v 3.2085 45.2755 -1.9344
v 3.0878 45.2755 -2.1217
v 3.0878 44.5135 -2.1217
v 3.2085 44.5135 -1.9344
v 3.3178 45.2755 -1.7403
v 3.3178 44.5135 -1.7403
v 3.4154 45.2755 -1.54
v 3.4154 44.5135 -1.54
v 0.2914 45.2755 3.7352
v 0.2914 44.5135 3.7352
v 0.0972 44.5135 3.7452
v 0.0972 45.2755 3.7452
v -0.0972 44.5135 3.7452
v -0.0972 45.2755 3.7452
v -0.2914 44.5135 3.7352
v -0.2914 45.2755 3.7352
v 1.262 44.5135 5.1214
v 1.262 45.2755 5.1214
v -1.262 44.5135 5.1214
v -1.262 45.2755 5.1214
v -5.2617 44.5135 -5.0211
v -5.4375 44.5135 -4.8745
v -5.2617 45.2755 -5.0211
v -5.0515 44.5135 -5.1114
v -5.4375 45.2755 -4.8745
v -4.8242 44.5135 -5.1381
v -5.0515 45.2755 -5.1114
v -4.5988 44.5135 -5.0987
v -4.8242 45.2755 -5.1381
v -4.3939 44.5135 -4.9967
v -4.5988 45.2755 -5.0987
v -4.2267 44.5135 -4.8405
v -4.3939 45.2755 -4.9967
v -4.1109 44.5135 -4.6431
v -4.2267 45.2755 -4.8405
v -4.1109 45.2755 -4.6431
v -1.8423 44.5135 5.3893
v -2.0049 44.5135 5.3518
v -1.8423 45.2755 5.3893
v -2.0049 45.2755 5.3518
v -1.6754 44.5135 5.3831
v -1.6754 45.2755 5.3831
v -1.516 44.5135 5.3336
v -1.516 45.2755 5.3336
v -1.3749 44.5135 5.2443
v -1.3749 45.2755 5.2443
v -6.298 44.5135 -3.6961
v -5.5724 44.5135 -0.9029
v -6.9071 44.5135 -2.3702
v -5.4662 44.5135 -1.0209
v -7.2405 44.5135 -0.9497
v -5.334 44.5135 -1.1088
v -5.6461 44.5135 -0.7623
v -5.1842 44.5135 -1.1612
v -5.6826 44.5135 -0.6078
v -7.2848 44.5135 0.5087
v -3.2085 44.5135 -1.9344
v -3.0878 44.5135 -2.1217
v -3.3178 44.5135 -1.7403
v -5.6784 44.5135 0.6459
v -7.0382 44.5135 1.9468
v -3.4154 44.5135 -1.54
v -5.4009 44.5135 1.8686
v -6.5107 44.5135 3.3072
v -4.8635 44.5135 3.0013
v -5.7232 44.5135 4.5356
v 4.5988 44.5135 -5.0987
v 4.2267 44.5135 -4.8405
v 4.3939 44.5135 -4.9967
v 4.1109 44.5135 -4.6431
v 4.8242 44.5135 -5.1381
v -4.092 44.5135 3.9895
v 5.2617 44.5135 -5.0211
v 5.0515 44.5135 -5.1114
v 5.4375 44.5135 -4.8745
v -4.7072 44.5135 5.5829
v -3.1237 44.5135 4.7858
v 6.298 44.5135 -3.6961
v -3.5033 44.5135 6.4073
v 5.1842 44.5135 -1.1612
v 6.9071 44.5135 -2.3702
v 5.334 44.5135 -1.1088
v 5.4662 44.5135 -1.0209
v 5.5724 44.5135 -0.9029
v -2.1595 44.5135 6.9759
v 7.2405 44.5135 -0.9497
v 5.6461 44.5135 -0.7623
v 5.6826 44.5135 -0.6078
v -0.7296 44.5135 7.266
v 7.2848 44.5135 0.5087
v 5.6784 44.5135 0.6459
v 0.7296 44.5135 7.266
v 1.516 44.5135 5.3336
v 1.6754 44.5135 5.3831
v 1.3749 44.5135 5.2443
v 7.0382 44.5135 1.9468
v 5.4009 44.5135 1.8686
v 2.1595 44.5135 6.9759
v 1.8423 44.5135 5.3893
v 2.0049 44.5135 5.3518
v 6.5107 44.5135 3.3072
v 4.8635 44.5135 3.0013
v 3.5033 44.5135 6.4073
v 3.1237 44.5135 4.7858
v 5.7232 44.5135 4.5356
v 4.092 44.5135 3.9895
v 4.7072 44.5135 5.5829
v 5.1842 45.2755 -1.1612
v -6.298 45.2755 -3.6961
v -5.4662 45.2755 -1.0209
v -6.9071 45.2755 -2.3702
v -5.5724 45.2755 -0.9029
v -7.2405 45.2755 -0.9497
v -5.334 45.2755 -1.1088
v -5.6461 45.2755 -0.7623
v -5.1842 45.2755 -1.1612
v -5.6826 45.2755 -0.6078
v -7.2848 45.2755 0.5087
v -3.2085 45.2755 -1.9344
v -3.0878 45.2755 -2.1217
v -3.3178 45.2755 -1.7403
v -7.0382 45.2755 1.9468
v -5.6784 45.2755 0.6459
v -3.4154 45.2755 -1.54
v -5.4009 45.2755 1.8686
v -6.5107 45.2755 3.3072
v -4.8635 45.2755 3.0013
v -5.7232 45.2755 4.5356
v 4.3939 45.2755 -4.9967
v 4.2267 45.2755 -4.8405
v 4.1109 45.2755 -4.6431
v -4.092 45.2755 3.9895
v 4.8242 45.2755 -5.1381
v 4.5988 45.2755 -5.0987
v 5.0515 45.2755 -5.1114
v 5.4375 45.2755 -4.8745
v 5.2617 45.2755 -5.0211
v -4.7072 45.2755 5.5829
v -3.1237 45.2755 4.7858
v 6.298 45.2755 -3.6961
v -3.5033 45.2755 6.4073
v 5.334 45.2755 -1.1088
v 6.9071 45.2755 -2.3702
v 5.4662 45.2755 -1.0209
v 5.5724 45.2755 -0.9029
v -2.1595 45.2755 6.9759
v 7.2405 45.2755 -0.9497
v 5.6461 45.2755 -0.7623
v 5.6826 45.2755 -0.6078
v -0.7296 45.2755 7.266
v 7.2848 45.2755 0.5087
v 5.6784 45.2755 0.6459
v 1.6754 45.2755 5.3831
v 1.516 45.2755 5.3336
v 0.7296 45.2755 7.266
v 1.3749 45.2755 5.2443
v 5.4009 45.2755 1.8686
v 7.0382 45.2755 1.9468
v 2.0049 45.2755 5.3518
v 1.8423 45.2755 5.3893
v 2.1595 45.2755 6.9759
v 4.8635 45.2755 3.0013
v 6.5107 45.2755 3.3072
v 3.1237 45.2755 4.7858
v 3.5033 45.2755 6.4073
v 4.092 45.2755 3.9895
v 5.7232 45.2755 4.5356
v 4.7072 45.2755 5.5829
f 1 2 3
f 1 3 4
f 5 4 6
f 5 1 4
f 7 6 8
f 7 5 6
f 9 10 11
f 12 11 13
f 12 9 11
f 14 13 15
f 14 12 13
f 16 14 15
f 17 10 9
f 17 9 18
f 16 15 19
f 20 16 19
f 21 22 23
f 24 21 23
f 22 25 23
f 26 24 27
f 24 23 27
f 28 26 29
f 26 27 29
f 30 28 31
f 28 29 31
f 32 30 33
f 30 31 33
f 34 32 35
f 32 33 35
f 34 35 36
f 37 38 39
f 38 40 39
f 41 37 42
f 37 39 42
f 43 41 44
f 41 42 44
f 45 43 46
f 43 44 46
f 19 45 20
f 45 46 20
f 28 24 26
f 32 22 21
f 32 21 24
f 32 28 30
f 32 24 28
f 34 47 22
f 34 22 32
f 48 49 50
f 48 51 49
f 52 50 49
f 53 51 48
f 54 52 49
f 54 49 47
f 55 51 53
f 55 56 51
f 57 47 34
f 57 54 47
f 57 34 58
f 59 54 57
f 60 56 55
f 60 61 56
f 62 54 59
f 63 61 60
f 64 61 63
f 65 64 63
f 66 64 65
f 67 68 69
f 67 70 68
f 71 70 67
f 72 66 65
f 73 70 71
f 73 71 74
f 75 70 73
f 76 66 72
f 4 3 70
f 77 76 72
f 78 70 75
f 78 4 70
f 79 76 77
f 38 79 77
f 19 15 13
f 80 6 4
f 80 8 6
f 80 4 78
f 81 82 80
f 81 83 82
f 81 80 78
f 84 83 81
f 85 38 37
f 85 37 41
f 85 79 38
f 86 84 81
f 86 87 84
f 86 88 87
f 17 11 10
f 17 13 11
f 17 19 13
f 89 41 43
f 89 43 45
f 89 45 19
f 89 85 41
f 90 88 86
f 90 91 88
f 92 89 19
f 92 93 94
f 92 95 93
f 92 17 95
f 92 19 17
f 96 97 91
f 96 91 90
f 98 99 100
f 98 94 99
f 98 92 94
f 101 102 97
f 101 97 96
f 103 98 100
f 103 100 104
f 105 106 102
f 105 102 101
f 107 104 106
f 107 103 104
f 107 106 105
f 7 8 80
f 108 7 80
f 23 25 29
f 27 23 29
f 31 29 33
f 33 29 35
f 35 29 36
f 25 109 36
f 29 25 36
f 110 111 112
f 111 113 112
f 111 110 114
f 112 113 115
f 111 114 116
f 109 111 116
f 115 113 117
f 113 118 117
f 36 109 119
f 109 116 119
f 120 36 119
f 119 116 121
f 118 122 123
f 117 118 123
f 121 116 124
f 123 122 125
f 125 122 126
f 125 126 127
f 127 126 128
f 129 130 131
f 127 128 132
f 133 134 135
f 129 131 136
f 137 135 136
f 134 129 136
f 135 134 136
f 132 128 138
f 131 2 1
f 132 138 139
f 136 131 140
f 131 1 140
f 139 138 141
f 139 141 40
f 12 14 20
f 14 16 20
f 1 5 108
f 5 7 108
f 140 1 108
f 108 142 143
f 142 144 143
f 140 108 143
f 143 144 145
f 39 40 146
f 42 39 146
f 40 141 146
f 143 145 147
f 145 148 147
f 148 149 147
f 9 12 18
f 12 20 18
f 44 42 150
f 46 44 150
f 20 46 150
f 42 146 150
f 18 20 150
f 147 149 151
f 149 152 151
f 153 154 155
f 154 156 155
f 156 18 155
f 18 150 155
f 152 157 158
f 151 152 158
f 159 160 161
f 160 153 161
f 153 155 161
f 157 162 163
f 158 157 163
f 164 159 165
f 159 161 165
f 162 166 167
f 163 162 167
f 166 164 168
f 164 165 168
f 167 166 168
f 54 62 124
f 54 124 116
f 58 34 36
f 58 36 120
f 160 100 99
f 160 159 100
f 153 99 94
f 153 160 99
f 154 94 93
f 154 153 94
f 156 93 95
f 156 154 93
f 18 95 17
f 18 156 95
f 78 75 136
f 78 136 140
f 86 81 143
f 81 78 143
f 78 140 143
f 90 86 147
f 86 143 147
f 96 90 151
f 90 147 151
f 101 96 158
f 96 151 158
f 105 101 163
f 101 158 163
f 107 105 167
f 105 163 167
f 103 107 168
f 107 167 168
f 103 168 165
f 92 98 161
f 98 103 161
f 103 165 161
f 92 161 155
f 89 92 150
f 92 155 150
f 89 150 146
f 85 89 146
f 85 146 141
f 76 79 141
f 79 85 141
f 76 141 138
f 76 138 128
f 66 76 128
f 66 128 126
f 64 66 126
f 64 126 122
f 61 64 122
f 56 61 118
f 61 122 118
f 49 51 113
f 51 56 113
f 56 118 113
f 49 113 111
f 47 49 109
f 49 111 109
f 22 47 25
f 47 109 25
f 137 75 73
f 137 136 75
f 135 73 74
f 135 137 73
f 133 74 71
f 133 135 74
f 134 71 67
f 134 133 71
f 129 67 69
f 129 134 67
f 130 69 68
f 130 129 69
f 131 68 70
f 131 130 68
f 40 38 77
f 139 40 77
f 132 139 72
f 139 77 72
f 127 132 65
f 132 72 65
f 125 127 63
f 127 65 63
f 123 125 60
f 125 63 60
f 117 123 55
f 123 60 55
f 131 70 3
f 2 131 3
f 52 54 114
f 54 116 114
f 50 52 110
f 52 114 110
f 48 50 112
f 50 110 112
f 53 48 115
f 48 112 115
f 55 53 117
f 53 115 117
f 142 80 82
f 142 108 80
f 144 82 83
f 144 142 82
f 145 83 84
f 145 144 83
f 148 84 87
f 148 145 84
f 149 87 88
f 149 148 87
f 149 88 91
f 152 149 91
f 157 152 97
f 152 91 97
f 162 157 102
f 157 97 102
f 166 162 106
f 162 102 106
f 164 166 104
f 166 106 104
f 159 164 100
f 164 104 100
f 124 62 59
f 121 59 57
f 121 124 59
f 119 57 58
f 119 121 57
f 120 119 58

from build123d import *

# Parameters (mm, degrees)
SKETCH046_R     = 7.3025
SKETCH046_R_2   = 3.7465
PAD007_DEPTH    = 0.762
POCKET006_DEPTH = 0.763
FILLET004_R     = 0.79375
FILLET005_R     = 0.635


with BuildPart() as part:
    # Sketch046 → Pad007 (new body)
    with BuildSketch(Plane.XZ):
        Circle(SKETCH046_R)
        Circle(SKETCH046_R_2, mode=Mode.SUBTRACT)
    extrude(amount=PAD007_DEPTH)

    # Sketch047 (on Face4 of Pad007) → Pocket006 (cut, through all)
    with BuildSketch(Plane.XZ.offset(0.762)):
        with BuildLine():
            Line((-4.545908, -5.715), (-3.087808, -2.121721))
            Line((-3.087808, -2.121721), (-2.896797, -1.651))
            Line((-2.896797, -1.651), (-3.415378, -1.539953))
            Line((-3.415378, -1.539953), (-5.614107, -1.069124))
            ThreePointArc((-1.531348, 5.506015), (-4.855151, 3.014752), (-5.614107, -1.069124))
            Line((-0.291377, 3.735152), (-1.531348, 5.506015))
            Line((-0.291377, 3.735152), (0, 3.319023))
            Line((0, 3.319023), (0.291377, 3.735152))
            Line((0.291377, 3.735152), (1.531348, 5.506015))
            ThreePointArc((5.614107, -1.069124), (4.855151, 3.014752), (1.531348, 5.506015))
            Line((3.415378, -1.539953), (5.614107, -1.069124))
            Line((3.415378, -1.539953), (2.896797, -1.651))
            Line((2.896797, -1.651), (3.087808, -2.121721))
            Line((4.545908, -5.715), (3.087808, -2.121721))
            Line((4.545908, -5.715), (5.040156, -5.715))
            ThreePointArc((-5.040156, -5.715), (0, -7.62), (5.040156, -5.715))
            Line((-4.545908, -5.715), (-5.040156, -5.715))
        make_face()
    extrude(amount=-POCKET006_DEPTH, mode=Mode.SUBTRACT)

    # Fillet004
    fillet004_edges = [part.edges().sort_by_distance(p)[0] for p in [
        (-4.545908, -0.381, -5.715),
        (4.545908, -0.381, -5.715),
    ]]
    fillet(fillet004_edges, radius=FILLET004_R)

    # Fillet005
    fillet005_edges = [part.edges().sort_by_distance(p)[0] for p in [
        (-5.614107, -0.381, -1.069124),
        (5.614107, -0.381, -1.069124),
        (-1.531348, -0.381, 5.506015),
        (1.531348, -0.381, 5.506015),
    ]]
    fillet(fillet005_edges, radius=FILLET005_R)


with BuildPart() as part_1:
    # Body005 placement: moved
    add(part.part.moved(Location((0, 45.2755, 0))))


solid = part_1.part
